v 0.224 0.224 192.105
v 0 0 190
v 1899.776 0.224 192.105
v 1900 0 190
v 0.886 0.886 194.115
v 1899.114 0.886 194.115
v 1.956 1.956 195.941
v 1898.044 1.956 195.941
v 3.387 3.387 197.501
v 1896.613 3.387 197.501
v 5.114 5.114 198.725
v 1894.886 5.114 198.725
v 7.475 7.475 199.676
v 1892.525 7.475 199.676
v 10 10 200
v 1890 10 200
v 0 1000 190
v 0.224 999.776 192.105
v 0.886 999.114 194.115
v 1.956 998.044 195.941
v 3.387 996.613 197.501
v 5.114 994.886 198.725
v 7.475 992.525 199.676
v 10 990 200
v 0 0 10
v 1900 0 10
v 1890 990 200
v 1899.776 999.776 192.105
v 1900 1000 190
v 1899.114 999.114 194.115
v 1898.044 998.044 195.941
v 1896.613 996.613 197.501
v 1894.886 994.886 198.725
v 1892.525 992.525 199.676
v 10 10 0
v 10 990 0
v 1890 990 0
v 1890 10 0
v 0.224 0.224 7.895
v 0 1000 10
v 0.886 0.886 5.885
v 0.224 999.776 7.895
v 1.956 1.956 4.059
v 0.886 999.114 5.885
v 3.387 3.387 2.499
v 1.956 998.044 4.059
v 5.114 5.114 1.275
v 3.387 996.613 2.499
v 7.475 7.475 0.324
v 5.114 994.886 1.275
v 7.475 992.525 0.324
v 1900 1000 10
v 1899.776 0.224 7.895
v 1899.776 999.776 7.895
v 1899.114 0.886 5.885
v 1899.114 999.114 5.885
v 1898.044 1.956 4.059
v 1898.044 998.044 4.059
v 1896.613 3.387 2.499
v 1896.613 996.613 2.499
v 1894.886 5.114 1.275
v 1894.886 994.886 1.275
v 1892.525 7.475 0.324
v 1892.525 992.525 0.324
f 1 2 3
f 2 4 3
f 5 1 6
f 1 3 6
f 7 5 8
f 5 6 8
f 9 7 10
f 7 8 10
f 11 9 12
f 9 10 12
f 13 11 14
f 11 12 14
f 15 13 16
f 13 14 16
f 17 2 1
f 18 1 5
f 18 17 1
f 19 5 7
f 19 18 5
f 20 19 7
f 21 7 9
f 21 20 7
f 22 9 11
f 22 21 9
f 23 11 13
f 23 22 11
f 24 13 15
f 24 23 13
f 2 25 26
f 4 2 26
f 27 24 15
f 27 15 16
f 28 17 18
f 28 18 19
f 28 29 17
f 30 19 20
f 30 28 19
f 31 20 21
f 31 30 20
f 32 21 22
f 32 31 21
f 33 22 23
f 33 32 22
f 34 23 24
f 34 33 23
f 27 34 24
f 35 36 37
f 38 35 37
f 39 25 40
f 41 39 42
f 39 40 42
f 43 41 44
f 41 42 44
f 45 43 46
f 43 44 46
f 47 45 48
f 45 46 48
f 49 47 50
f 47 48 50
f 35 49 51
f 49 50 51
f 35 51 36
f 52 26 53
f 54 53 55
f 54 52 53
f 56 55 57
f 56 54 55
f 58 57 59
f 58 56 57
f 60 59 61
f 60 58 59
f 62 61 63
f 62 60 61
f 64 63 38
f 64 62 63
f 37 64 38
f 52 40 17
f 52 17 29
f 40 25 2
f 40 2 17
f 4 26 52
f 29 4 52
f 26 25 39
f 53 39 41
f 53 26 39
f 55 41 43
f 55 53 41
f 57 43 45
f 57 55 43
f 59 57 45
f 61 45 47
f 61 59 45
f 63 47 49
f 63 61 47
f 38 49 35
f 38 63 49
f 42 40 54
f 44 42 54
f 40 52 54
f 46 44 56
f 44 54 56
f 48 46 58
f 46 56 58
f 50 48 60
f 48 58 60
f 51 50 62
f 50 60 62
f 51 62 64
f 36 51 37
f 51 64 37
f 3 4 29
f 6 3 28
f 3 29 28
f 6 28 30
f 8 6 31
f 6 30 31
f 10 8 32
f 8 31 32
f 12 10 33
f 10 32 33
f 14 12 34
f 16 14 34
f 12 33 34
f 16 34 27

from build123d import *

# Parameters (mm, degrees)
SKETCH1_W           = 190
SKETCH1_H           = 100
BOSS_EXTRUDE1_DEPTH = 20
FILLET1_R           = 1
SCALE1_SCALE        = 10


with BuildPart() as part:
    # Sketch1 → Boss-Extrude1 (new body)
    with BuildSketch(Plane.XY):
        with Locations((95, 50)):
            Rectangle(SKETCH1_W, SKETCH1_H)
    extrude(amount=BOSS_EXTRUDE1_DEPTH)

    # Fillet1
    fillet1_edges = [part.edges().sort_by_distance(p)[0] for p in [
        (190, 50, 20),
        (95, 100, 20),
        (0, 50, 20),
        (95, 100, 0),
        (190, 50, 0),
        (95, 0, 0),
        (0, 50, 0),
        (95, 0, 20),
    ]]
    fillet(fillet1_edges, radius=FILLET1_R)


with BuildPart() as part_1:
    # Scale1: scaled about (0, 0, 0)
    add(part.part.scale(SCALE1_SCALE))


solid = part_1.part
